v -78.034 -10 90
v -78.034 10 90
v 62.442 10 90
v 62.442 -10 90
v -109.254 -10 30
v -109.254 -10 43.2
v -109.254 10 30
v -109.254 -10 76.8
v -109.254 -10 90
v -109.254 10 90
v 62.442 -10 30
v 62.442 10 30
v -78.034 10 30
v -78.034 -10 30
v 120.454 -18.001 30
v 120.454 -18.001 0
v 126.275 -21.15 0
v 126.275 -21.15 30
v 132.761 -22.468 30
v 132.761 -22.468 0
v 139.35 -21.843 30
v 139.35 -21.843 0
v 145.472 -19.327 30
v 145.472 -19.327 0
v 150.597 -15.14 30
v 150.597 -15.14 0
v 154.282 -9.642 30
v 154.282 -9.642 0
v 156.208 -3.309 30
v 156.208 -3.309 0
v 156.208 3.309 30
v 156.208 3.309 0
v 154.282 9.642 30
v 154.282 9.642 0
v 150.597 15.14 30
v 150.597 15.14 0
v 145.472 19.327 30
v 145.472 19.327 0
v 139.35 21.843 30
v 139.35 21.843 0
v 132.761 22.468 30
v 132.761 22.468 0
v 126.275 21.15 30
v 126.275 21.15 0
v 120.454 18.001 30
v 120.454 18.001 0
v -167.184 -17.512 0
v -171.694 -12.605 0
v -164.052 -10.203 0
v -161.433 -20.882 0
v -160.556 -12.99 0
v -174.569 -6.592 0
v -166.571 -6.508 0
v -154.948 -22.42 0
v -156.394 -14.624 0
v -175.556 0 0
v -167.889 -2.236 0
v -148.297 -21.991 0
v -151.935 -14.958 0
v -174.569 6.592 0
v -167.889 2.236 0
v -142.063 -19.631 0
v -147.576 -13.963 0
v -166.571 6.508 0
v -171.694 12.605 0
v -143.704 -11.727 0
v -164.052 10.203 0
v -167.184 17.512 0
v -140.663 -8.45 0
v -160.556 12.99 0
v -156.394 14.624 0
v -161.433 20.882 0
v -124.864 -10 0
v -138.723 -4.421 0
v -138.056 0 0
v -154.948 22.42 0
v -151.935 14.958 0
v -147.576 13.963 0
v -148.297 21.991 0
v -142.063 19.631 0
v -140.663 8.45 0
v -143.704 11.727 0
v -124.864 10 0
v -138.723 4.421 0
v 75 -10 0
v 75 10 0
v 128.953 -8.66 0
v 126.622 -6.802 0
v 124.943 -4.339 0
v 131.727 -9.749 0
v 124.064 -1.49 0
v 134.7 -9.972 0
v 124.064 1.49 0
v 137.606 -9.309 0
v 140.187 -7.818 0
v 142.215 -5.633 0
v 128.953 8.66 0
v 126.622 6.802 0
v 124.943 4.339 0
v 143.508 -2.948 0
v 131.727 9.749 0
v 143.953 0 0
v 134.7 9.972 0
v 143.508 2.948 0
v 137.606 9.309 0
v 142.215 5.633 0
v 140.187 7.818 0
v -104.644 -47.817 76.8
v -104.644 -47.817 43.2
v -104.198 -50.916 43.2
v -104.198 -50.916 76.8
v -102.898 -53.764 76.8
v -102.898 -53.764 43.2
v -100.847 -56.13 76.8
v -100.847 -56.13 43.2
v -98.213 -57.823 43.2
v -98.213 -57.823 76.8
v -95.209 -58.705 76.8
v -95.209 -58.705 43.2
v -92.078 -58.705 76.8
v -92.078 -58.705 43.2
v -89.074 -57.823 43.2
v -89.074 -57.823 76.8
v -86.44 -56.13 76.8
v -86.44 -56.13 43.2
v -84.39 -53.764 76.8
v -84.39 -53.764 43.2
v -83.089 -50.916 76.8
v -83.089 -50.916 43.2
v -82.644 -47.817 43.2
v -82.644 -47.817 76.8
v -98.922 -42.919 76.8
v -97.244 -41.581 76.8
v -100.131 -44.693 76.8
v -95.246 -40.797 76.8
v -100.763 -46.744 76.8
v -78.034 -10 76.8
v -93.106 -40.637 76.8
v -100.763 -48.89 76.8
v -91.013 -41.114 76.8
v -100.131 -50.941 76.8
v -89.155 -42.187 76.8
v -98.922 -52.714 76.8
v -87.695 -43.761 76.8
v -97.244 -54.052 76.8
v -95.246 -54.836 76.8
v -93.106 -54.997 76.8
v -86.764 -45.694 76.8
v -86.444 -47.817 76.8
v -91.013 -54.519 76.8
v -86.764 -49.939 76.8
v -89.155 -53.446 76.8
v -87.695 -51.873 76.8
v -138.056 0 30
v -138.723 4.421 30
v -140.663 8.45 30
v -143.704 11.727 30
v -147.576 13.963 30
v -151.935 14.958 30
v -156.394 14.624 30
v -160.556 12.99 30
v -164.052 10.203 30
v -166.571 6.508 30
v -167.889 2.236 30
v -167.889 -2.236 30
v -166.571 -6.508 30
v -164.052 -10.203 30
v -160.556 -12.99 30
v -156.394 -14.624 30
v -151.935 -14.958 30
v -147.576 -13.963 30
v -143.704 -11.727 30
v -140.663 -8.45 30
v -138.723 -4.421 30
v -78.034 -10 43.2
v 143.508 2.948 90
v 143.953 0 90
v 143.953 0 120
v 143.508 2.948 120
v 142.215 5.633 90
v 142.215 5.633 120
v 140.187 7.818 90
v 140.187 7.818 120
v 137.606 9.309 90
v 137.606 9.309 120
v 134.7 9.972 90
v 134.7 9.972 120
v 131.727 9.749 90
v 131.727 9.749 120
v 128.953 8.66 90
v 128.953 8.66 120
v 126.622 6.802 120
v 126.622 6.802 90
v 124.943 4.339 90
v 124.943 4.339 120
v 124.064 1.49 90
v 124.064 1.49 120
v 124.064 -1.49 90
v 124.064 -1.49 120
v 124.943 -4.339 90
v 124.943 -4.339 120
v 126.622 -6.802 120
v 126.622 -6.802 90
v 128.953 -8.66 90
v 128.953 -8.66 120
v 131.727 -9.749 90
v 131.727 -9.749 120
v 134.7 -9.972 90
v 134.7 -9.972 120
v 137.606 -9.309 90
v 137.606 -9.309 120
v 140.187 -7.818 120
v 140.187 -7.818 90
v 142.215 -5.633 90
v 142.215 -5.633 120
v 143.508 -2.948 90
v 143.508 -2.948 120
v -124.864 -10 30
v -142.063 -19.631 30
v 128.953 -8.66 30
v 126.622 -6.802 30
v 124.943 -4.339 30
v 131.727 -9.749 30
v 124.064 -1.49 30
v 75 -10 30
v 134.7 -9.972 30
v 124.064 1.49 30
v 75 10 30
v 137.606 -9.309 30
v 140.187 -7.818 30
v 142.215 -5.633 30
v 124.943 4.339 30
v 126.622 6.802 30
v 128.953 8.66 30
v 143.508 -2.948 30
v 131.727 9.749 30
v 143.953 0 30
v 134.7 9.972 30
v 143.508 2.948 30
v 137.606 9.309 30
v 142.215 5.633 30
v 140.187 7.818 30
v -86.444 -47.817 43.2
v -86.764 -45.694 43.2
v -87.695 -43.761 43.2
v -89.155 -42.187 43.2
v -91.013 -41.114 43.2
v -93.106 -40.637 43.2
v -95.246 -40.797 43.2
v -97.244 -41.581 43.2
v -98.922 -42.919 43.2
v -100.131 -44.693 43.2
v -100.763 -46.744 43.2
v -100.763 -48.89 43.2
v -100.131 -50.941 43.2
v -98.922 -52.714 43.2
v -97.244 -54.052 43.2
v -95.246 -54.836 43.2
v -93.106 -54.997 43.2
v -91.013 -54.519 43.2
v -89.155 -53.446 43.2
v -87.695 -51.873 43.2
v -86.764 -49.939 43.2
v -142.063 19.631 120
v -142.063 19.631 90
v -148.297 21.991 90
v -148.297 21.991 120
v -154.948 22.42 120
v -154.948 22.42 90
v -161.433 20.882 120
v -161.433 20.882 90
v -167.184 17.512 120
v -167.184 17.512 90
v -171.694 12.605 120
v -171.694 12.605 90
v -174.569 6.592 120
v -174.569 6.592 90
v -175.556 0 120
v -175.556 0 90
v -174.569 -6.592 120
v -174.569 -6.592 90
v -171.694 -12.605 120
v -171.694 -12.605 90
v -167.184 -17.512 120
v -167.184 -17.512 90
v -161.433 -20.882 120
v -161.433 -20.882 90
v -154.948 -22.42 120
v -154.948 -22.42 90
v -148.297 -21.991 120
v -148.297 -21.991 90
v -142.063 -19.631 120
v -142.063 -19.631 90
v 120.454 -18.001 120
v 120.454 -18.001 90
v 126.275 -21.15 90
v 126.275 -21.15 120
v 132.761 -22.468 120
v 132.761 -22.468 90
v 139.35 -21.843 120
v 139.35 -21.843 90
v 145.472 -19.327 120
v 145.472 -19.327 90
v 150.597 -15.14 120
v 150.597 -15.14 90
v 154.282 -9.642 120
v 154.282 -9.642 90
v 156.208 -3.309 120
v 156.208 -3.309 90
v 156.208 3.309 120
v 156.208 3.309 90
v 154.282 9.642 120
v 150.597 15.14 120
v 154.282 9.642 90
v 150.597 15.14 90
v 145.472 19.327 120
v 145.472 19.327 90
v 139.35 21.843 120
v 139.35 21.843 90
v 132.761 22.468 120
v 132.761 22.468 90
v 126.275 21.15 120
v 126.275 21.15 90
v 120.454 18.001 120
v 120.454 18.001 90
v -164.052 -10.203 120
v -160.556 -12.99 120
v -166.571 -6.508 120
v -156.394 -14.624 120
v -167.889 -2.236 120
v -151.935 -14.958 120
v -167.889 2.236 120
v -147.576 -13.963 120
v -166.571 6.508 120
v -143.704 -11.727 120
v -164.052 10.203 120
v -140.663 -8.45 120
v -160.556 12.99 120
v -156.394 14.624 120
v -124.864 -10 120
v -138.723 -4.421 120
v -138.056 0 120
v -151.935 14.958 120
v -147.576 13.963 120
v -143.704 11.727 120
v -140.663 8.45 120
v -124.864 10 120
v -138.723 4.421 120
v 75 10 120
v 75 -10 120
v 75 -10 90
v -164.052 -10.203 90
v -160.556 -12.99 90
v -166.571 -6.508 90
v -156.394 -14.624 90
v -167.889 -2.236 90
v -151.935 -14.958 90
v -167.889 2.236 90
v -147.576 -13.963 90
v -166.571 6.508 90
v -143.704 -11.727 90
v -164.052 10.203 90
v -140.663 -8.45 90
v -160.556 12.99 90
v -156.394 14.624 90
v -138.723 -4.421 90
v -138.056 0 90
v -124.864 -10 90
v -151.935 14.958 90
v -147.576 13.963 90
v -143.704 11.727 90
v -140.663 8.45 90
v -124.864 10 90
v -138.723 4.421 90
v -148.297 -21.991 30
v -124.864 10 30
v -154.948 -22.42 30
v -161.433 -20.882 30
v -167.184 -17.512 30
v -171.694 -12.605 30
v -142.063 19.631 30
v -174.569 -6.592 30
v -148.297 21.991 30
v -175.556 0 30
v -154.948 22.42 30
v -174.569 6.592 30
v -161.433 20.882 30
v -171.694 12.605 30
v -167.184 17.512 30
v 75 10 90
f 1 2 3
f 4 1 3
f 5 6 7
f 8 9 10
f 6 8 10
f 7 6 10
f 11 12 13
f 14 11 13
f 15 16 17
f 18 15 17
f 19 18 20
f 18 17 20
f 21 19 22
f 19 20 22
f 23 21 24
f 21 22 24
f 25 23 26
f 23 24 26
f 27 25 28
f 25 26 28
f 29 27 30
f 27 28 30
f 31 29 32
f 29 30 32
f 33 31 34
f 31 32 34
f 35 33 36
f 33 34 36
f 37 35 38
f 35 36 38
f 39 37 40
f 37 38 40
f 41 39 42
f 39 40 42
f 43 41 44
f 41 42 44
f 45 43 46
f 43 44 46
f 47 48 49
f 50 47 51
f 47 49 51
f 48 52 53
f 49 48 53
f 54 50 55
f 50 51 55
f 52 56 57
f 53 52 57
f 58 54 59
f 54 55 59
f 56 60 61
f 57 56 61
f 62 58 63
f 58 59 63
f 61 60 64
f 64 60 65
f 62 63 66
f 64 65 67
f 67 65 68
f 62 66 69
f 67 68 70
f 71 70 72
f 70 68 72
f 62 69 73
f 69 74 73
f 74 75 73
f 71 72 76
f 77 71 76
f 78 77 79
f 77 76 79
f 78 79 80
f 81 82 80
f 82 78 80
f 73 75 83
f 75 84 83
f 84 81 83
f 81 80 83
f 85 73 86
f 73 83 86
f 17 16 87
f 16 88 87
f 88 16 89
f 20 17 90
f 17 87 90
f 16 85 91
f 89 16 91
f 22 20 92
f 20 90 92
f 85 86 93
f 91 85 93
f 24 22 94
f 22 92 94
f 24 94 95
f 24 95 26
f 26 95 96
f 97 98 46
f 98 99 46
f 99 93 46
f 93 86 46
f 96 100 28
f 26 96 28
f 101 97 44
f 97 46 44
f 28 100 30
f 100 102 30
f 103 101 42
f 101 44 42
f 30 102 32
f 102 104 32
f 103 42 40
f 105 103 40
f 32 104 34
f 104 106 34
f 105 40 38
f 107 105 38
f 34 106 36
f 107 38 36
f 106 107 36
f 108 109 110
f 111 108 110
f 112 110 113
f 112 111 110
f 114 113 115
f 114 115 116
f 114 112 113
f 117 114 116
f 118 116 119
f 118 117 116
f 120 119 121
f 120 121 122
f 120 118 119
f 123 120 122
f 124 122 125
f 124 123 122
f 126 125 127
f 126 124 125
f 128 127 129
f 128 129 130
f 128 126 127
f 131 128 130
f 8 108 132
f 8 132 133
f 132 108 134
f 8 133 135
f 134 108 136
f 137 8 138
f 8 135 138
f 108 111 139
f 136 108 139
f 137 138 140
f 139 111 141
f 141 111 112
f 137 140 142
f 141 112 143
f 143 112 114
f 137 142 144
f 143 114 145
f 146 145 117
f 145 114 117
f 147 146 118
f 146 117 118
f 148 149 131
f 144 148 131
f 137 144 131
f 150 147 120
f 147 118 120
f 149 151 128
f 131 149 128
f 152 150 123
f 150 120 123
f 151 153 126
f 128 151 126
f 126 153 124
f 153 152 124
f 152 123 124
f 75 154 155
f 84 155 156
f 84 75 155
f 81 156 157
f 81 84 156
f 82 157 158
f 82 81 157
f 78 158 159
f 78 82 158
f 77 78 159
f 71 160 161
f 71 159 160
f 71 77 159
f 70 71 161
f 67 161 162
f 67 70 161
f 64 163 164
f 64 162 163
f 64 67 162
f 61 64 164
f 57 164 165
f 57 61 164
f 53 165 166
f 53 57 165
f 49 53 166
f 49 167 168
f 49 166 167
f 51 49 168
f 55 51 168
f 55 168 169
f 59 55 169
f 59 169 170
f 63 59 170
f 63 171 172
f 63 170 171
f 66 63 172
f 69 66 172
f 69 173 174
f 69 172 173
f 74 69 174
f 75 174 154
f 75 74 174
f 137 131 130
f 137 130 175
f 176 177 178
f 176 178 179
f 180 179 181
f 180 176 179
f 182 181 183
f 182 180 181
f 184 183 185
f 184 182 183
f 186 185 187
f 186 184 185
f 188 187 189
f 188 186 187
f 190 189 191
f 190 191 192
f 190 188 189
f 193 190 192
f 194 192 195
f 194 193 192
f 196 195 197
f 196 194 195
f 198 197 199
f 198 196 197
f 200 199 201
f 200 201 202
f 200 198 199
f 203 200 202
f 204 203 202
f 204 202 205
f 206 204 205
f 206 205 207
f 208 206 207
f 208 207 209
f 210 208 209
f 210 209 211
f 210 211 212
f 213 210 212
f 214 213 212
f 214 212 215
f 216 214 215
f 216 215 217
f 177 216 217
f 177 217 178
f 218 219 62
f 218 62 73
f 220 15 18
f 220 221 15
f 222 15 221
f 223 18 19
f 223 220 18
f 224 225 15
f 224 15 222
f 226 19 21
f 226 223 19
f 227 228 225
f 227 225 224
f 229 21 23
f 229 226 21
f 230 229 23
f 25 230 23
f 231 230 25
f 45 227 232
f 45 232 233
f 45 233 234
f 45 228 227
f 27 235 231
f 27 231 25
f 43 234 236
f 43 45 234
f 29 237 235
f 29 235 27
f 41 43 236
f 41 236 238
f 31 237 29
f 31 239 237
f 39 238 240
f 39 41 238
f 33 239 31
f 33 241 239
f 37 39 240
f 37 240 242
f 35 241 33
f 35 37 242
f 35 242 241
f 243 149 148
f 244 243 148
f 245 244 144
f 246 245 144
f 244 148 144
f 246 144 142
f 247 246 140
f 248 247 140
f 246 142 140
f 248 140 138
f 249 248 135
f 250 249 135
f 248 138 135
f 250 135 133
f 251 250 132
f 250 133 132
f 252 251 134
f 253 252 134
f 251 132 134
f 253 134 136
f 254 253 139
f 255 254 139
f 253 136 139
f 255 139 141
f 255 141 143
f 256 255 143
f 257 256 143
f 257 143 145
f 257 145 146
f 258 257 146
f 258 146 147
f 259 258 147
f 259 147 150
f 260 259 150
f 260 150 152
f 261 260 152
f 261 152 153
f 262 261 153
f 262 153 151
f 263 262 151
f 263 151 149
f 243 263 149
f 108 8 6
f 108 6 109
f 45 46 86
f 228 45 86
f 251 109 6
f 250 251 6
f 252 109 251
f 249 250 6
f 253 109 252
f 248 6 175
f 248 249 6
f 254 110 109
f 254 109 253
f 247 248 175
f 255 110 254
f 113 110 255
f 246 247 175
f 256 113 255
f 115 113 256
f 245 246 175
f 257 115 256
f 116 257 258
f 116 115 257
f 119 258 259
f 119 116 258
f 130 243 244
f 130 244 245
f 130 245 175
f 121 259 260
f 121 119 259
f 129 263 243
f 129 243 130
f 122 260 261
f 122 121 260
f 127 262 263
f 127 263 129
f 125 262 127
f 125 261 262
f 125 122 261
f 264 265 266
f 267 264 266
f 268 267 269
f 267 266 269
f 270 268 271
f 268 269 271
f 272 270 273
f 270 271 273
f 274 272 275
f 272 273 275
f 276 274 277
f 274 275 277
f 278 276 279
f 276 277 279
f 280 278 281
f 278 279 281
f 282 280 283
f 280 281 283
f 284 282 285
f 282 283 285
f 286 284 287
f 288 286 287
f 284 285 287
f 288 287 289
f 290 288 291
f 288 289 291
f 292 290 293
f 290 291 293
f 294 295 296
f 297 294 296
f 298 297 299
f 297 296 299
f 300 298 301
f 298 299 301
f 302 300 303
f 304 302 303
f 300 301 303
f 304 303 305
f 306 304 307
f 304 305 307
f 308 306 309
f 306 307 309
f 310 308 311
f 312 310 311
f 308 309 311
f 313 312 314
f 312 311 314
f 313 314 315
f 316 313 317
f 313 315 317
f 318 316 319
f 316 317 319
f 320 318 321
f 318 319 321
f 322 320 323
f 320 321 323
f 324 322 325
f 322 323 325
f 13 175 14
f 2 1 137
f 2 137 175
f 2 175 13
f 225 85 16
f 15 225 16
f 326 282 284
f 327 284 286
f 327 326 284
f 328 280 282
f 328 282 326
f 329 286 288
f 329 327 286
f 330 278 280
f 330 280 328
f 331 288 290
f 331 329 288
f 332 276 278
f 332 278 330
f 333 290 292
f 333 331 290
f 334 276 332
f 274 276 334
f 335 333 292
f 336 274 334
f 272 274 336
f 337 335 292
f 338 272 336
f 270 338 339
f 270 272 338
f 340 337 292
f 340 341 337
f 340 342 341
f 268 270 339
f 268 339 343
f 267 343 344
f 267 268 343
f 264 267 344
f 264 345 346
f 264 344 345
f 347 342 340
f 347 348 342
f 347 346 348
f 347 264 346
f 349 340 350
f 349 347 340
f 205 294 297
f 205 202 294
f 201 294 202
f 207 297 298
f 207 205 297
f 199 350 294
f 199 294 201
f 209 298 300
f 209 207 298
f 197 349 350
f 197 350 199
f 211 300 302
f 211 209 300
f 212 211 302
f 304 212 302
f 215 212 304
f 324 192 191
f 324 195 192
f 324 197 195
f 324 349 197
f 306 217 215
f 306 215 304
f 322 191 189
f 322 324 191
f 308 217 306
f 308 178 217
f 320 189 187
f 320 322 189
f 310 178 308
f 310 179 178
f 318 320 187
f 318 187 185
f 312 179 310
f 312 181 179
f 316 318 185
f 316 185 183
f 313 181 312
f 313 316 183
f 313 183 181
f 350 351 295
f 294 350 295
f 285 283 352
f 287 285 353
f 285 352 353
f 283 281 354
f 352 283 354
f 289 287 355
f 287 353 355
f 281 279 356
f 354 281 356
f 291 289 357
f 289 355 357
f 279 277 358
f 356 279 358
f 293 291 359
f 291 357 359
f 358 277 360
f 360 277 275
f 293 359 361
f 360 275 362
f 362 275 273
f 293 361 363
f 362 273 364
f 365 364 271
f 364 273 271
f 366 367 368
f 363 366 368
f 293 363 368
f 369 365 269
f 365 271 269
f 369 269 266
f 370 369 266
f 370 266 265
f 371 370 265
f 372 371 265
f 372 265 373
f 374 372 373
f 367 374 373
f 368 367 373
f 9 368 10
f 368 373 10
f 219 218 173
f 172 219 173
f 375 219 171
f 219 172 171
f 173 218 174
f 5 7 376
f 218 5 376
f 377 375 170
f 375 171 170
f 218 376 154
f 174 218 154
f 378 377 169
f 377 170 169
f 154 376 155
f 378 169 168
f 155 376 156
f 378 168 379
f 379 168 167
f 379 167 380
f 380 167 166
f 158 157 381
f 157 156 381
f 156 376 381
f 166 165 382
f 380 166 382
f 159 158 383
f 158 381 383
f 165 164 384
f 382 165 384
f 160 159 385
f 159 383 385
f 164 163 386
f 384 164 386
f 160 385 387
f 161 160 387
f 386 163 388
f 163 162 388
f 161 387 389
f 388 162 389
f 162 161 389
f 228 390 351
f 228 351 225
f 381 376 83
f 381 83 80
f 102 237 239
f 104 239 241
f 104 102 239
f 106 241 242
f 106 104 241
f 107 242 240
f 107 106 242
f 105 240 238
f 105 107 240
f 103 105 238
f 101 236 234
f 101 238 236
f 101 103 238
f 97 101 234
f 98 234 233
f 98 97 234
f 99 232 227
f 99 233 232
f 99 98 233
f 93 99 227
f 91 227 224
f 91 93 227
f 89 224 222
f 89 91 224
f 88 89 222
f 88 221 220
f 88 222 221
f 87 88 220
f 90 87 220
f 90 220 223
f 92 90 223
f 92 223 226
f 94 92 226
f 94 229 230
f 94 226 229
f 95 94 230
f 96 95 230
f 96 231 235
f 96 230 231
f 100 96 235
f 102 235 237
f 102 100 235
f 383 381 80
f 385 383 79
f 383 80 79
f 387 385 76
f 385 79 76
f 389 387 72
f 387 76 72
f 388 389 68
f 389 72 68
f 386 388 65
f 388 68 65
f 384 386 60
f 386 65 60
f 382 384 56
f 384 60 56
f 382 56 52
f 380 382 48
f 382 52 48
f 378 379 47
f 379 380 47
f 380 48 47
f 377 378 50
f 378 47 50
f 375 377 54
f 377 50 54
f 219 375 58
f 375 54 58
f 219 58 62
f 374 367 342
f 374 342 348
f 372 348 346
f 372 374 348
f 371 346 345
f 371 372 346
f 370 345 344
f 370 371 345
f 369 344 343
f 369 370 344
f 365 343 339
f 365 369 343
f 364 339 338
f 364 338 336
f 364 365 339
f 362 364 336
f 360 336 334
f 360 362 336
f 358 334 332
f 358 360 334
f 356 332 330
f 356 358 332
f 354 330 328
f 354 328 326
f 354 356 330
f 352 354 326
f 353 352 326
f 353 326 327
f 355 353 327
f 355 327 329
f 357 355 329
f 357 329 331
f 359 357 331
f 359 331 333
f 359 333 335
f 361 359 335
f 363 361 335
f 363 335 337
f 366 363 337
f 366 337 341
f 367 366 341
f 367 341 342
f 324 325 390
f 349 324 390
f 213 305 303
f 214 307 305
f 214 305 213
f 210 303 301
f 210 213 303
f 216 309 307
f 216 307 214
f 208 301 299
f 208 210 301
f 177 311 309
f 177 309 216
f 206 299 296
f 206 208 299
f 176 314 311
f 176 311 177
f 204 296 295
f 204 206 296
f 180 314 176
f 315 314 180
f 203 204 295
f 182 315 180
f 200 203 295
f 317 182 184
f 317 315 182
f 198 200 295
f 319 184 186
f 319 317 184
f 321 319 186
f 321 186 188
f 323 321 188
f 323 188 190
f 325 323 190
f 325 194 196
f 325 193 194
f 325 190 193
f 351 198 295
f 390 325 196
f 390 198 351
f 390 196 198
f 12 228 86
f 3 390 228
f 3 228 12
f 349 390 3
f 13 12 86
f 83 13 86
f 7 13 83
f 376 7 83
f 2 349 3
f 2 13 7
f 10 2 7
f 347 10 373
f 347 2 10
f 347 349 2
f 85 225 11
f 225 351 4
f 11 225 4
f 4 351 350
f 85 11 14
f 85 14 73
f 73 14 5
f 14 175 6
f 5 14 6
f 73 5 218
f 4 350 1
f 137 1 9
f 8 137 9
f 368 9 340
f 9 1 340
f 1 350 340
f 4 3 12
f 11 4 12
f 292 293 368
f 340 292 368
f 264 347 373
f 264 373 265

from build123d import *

# Parameters (mm, degrees)
SKETCH1_R           = 10
SKETCH1_R_2         = 15
BOSS_EXTRUDE1_DEPTH = 120
CUT_EXTRUDE1_DEPTH  = 45
SKETCH3_R           = 11
SKETCH3_R_2         = 7.2
BOSS_EXTRUDE2_DEPTH = 120
CUT_EXTRUDE2_DEPTH  = 180
SKETCH5_W           = 31.21991305
SKETCH5_H           = 33.6
BOSS_EXTRUDE3_DEPTH = 20
SKETCH6_W           = 31.21991305
SKETCH6_H           = 20
BOSS_EXTRUDE4_DEPTH = 13.2
SKETCH8_W           = 31.21991305
SKETCH8_H           = 20
BOSS_EXTRUDE5_DEPTH = 13.2
CUT_EXTRUDE3_DEPTH  = 40


with BuildPart() as part:
    # Sketch1 → Boss-Extrude1 (new body)
    with BuildSketch(Plane.XY):
        with BuildLine():
            Line((75, 10), (-124.86381146, 10))
            Line((-124.86381146, 10), (-142.062836025, 19.631407747))
            ThreePointArc((-142.062836025, 19.631407747), (-175.556371847, 0), (-142.062836025, -19.631407747))
            Line((-142.062836025, -19.631407747), (-124.86381146, -10))
            Line((-124.86381146, -10), (75, -10))
            Line((75, -10), (120.453543604, -18.000740708))
            ThreePointArc((120.453543604, -18.000740708), (156.452555937, 0), (120.453543604, 18.000740708))
            Line((120.453543604, 18.000740708), (75, 10))
        make_face()
        with Locations((133.952555937, 0)):
            Circle(SKETCH1_R, mode=Mode.SUBTRACT)
        with Locations((-153.056371847, 0)):
            Circle(SKETCH1_R_2, mode=Mode.SUBTRACT)
    extrude(amount=BOSS_EXTRUDE1_DEPTH)

    # Sketch2 → Cut-Extrude1 (cut, symmetric)
    with BuildSketch(Plane(origin=(0, 10, 0), x_dir=(1, 0, 0), z_dir=(0, 1, 0))):
        Polygon((-124.86381146, -90), (-124.86381146, -60), (-124.86381146, -30), (-189.632147982, -30), (-189.632147982, -90), align=None)
        Polygon((-124.86381146, -30), (-124.86381146, -60), (-124.86381146, -90), (62.44239577, -90), (62.44239577, -30), align=None)
    extrude(amount=CUT_EXTRUDE1_DEPTH, both=True, mode=Mode.SUBTRACT)

    # Sketch3 → Boss-Extrude2 (add)
    with BuildSketch(Plane.XY.offset(120)):
        with BuildLine():
            Line((-109.253854935, -10), (-104.64389841, -47.8166351))
            ThreePointArc((-104.64389841, -47.8166351), (-93.64389841, -36.8166351), (-82.64389841, -47.8166351))
            Line((-82.64389841, -47.8166351), (-78.033941885, -10))
            Line((-78.033941885, -10), (-109.253854935, -10))
        make_face()
        with Locations((-93.64389841, -47.8166351)):
            Circle(SKETCH3_R)
        with Locations((-93.64389841, -47.8166351)):
            Circle(SKETCH3_R_2, mode=Mode.SUBTRACT)
    extrude(amount=-BOSS_EXTRUDE2_DEPTH)

    # Sketch4 → Cut-Extrude2 (cut)
    with BuildSketch(Plane.ZY.offset(-62.44239577)):
        Polygon((43.2, -58.8166351), (43.2, -10), (30, -10), (-9.185341586, -10), (-9.185341586, -58.8166351), align=None)
        Polygon((90, -10), (76.8, -10), (76.8, -58.8166351), (133.966164795, -58.8166351), (133.966164795, -10), align=None)
    extrude(amount=CUT_EXTRUDE2_DEPTH, mode=Mode.SUBTRACT)

    # Sketch5 → Boss-Extrude3 (add)
    with BuildSketch(Plane(origin=(0, -10, 0), x_dir=(1, 0, 0), z_dir=(0, 1, 0))):
        with Locations((-93.64389841, -60)):
            Rectangle(SKETCH5_W, SKETCH5_H)
    extrude(amount=BOSS_EXTRUDE3_DEPTH)

    # Sketch6 → Boss-Extrude4 (add)
    with BuildSketch(Plane(origin=(0, 0, 43.2), x_dir=(-1, 0, 0), z_dir=(0, 0, -1))):
        with Locations((93.64389841, 0)):
            Rectangle(SKETCH6_W, SKETCH6_H)
    extrude(amount=BOSS_EXTRUDE4_DEPTH)

    # Sketch8 → Boss-Extrude5 (add)
    with BuildSketch(Plane(origin=(0, 0, 90), x_dir=(-1, 0, 0), z_dir=(0, 0, -1))):
        with Locations((93.64389841, 0)):
            Rectangle(SKETCH8_W, SKETCH8_H)
    extrude(amount=BOSS_EXTRUDE5_DEPTH)

    # Sketch9 → Cut-Extrude3 (cut, symmetric)
    with BuildSketch(Plane(origin=(0, 10, 0), x_dir=(1, 0, 0), z_dir=(0, 1, 0))):
        Polygon((156.452555937, -30), (156.452555937, -60), (156.452555937, -90), (75, -90), (75, -30), align=None)
    extrude(amount=CUT_EXTRUDE3_DEPTH, both=True, mode=Mode.SUBTRACT)


solid = part.part
